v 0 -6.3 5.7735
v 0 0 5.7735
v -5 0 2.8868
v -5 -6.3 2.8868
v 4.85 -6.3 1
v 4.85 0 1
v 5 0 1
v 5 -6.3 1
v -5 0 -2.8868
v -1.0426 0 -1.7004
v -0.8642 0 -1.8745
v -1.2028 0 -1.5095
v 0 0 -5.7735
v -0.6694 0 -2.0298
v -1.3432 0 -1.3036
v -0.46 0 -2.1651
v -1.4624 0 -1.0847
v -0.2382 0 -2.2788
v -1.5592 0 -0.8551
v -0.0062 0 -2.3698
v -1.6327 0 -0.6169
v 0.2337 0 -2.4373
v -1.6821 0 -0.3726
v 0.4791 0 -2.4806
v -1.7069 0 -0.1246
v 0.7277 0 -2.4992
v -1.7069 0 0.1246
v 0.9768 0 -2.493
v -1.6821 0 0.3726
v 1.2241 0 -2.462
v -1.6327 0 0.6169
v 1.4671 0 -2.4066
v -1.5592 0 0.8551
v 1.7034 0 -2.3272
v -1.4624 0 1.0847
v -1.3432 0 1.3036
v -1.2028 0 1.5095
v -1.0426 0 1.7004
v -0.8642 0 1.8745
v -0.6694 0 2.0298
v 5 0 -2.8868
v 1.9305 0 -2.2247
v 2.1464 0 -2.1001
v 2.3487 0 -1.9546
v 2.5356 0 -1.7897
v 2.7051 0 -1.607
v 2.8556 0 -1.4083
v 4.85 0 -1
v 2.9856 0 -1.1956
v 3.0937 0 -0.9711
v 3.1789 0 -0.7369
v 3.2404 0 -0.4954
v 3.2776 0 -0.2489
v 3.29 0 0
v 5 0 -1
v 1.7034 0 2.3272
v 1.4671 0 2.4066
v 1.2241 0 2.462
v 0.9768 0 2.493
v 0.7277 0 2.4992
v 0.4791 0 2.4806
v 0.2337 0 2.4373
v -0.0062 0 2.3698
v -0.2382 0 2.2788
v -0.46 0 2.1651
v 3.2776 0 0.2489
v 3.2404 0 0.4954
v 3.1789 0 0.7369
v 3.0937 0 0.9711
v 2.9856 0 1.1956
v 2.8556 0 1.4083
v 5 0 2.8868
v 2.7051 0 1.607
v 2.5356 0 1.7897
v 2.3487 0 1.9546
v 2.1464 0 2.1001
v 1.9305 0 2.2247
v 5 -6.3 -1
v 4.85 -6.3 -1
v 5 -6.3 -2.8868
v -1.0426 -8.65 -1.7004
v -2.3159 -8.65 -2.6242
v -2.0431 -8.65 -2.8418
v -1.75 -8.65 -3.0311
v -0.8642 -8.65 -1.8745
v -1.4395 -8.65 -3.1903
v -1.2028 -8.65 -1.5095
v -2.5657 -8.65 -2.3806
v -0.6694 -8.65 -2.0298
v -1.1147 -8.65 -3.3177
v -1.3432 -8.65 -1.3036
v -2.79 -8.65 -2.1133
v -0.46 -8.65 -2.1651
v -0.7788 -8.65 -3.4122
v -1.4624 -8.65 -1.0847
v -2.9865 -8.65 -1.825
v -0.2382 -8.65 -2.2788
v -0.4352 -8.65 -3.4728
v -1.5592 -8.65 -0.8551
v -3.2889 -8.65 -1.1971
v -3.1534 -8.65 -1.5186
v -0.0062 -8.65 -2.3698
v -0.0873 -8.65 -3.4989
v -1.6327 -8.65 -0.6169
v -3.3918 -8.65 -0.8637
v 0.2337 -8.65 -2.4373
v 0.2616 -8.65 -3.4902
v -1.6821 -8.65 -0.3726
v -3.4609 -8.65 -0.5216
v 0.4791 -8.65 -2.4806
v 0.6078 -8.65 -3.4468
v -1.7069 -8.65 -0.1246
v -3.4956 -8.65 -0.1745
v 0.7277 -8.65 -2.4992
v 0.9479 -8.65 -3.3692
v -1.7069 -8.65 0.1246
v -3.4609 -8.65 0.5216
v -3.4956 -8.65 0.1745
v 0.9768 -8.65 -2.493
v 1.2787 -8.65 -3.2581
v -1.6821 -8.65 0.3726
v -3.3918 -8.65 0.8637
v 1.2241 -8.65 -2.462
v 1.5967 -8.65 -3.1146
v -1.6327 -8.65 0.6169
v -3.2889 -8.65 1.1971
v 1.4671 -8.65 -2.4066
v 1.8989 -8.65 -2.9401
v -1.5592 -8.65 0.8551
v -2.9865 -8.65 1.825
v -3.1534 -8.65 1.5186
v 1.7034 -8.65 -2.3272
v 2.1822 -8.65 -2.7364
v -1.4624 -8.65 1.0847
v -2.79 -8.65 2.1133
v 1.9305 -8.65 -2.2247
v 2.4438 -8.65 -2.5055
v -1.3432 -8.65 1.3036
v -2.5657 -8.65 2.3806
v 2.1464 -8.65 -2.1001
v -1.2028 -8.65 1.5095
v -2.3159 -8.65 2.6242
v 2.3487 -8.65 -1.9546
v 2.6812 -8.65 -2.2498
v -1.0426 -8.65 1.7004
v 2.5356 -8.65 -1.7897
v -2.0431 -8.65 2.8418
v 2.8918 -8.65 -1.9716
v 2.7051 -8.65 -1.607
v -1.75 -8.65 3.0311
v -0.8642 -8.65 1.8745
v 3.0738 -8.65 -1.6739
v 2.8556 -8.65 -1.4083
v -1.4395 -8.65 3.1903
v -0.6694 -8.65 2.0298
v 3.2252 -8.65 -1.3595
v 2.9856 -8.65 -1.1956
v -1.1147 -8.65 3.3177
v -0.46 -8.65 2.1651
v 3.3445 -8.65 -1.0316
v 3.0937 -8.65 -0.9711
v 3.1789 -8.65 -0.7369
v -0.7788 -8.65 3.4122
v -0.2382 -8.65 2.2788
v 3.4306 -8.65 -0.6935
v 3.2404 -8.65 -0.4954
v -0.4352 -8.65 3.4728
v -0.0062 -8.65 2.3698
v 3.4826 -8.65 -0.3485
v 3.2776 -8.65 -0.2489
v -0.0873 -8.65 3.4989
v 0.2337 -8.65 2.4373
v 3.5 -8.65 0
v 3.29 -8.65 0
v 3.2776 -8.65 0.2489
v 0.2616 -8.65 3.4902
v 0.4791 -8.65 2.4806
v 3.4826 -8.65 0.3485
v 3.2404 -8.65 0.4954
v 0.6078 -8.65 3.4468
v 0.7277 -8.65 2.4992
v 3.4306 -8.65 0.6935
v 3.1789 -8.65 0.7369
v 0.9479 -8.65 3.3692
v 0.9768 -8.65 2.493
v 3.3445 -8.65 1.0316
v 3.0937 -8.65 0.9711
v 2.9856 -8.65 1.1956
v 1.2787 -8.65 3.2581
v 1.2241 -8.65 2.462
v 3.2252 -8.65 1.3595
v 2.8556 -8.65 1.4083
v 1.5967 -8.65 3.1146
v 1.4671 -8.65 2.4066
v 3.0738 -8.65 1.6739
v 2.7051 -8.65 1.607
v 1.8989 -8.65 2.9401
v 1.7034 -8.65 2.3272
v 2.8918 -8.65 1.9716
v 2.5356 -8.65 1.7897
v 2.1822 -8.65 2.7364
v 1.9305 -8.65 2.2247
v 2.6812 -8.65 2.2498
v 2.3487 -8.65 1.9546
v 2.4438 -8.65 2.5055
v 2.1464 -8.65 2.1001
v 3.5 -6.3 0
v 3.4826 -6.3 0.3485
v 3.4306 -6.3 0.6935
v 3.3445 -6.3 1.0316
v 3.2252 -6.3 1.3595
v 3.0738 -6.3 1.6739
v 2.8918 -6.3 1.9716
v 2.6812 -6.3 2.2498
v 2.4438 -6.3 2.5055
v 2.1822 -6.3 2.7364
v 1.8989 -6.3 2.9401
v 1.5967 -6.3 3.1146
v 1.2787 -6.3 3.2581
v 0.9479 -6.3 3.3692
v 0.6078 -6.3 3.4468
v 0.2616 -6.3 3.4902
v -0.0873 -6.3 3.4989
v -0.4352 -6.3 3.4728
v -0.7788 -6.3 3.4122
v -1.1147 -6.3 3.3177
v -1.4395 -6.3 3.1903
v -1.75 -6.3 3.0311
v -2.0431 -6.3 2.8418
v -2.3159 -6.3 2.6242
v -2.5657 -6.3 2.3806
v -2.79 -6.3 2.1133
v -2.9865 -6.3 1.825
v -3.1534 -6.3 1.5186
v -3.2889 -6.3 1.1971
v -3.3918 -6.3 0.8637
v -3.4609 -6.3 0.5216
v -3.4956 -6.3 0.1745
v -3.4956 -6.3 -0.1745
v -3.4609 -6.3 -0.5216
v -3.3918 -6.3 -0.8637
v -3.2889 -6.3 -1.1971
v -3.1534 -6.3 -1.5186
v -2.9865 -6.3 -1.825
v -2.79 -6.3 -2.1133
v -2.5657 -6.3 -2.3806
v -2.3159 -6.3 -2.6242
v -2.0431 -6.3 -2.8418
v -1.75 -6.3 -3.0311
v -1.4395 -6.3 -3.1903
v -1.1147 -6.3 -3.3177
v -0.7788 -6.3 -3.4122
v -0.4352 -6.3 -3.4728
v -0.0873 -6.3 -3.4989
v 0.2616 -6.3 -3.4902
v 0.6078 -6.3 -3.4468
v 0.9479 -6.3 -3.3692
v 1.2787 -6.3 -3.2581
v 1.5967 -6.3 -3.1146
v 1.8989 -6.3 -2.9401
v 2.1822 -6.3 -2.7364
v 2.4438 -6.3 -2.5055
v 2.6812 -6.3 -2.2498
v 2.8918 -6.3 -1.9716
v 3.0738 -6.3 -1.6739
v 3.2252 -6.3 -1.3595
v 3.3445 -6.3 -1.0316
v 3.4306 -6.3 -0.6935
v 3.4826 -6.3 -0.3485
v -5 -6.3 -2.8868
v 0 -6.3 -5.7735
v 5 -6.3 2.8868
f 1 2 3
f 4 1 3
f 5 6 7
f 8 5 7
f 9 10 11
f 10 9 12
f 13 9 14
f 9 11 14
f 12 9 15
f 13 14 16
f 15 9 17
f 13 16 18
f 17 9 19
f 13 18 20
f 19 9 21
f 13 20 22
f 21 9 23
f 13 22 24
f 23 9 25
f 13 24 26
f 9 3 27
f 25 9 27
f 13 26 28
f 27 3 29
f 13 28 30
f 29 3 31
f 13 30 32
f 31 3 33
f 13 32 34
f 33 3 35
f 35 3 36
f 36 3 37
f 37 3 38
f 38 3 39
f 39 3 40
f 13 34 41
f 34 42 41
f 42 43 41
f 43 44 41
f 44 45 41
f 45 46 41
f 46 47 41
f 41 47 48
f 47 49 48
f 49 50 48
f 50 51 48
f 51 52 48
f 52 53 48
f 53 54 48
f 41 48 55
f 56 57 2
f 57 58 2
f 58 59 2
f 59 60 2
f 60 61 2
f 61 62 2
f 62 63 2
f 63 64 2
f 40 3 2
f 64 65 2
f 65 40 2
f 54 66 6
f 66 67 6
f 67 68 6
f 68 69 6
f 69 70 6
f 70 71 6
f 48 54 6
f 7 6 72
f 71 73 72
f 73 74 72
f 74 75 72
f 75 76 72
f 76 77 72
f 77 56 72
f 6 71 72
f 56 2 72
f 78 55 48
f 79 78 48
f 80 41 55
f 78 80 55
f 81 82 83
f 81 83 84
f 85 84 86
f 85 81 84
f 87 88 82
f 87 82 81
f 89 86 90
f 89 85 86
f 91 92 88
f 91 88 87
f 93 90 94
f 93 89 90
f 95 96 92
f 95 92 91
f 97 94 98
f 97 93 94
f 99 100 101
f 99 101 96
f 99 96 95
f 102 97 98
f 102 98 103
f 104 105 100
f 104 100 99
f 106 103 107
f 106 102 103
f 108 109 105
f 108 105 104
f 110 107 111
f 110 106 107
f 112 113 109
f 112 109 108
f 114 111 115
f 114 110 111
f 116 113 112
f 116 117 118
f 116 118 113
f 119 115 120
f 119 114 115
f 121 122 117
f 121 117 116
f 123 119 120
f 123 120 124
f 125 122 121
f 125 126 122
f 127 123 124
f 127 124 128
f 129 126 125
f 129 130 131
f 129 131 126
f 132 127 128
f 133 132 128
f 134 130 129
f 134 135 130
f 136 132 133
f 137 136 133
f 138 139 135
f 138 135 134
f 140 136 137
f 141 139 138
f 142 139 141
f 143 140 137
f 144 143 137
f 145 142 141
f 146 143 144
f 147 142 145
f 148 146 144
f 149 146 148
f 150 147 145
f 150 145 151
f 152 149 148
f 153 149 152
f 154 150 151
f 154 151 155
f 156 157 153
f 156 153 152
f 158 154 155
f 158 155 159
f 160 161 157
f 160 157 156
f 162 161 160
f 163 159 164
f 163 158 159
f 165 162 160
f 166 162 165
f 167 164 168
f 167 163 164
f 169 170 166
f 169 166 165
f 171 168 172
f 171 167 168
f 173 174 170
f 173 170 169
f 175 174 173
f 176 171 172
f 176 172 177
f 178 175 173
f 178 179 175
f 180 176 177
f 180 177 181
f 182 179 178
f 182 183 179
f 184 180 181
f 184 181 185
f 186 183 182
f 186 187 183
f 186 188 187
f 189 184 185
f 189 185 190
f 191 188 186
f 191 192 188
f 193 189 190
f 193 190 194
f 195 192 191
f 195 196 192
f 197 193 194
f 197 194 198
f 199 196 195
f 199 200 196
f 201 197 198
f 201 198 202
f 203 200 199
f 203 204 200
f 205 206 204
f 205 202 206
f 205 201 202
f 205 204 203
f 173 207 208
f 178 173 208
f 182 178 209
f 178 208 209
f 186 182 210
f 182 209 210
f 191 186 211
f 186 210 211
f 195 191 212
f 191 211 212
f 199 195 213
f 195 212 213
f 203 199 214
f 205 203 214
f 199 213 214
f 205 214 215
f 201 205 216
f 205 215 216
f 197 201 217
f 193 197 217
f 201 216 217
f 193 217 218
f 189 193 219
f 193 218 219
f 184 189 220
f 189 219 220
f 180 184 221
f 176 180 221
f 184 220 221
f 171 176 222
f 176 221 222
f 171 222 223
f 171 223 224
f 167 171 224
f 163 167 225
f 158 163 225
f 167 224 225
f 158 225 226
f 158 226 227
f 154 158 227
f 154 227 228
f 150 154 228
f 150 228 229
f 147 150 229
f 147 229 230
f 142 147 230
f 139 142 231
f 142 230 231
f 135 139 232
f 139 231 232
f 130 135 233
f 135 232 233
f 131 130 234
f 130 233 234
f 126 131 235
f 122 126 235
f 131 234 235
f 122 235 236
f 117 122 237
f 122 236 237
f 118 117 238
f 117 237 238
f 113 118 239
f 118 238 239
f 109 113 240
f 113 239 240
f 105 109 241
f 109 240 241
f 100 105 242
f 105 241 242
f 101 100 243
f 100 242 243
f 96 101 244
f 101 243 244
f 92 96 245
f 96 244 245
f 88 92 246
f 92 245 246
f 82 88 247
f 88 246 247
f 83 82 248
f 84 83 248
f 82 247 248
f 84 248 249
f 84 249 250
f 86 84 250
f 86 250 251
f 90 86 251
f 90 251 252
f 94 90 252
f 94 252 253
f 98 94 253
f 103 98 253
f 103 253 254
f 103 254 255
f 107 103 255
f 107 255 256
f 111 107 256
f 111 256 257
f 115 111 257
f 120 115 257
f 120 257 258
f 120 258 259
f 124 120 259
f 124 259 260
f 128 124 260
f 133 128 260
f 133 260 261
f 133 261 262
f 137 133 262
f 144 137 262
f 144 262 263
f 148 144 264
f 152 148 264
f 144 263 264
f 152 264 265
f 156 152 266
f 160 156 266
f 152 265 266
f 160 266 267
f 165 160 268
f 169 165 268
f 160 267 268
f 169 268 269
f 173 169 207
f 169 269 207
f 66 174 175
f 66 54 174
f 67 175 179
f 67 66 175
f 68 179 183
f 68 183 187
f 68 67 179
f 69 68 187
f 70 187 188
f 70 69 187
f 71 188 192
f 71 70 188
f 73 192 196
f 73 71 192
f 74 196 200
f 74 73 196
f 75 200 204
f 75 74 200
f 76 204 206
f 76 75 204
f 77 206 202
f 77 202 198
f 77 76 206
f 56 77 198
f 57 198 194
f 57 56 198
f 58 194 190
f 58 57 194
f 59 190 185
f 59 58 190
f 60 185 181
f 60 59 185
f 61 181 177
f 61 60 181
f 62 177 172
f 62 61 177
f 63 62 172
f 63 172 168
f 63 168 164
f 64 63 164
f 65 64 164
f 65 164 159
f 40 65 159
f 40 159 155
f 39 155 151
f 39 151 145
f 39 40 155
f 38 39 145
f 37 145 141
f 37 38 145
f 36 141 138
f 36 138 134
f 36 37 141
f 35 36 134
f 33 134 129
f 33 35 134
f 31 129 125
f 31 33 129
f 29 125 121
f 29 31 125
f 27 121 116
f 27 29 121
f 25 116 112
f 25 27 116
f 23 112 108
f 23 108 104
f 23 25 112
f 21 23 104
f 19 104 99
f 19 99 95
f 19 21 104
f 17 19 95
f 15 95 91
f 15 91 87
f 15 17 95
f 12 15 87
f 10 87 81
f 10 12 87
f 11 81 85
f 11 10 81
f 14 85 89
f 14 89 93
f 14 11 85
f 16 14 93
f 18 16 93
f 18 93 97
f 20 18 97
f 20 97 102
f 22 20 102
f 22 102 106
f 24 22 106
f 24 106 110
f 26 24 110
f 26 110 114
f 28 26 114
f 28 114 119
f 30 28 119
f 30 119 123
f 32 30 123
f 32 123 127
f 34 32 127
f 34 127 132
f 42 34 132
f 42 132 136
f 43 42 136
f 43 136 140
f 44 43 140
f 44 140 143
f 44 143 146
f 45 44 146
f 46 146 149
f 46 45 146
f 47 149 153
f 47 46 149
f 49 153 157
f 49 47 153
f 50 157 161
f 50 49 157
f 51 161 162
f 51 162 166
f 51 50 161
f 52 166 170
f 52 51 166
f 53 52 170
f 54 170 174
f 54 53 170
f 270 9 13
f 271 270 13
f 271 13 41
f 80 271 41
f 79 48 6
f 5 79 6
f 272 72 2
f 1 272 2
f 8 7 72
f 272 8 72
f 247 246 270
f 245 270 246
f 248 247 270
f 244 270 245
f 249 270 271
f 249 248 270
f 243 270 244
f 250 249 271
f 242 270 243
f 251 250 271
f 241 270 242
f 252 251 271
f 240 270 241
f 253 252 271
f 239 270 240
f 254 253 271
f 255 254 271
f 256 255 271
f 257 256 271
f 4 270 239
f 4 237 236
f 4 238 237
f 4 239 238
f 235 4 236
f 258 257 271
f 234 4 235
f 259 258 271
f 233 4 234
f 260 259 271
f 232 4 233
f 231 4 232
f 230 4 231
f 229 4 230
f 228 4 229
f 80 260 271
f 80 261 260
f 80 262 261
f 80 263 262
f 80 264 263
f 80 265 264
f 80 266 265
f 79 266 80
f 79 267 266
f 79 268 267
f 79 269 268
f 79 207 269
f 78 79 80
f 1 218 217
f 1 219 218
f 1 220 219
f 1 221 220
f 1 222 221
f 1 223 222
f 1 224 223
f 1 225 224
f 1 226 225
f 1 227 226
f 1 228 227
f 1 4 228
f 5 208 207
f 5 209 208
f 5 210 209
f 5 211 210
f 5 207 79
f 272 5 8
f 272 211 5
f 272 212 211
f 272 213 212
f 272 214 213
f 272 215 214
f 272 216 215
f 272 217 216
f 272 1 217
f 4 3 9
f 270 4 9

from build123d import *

# Parameters (mm, degrees)
F0_R     = 2.5
F1_DEPTH = 6.3
F3_R     = 3.5
F4_DEPTH = 2.35
F5_DEPTH = 8.65
F0_W     = 0.15
F0_H     = 2
F8_DEPTH = 22


# Not quite as in the source:
# - an extrude ends at something that could not be found from the text; its depth is read off the source's solid
# - a feature names something its author has since deleted; it is built from what else it names


with BuildPart() as f1:
    # F0 (on Front) → F1 (new body)
    with BuildSketch(Plane.XZ):
        Polygon((5, 1), (5, 2.8867513459), (0, 5.7735026919), (-5, 2.8867513459), (-5, -2.8867513459), (0, -5.7735026919), (5, -2.8867513459), (5, -1), (4.85, -1), (4.85, 1), align=None)
        with Locations((0.79, 0)):
            Circle(F0_R, mode=Mode.SUBTRACT)
    extrude(amount=F1_DEPTH)

    # F3 (on offset) → F4 (join)
    with BuildSketch(Plane.XZ.offset(6.3)):
        Circle(F3_R)
    extrude(amount=F4_DEPTH)

    # F0 (on Front) → F5 (cut, through all)
    with BuildSketch(Plane.XZ):
        with Locations((0.79, 0)):
            Circle(F0_R)
    extrude(amount=F5_DEPTH, mode=Mode.SUBTRACT)

    # F6 (on Top) → F7 (revolve, cut)
    with BuildSketch(Plane.XY):
        Polygon((-6.0966597098, -6.5938490836), (-5, -6.3), (-6.0966597098, -6.3), align=None)
    revolve(axis=Axis((0, -6.5372320823, 0), (0, -1, 0)), mode=Mode.SUBTRACT)

    # F0 (on Front) → F8 (cut, through all)
    with BuildSketch(Plane.XZ):
        with Locations((4.925, 0)):
            Rectangle(F0_W, F0_H)
    extrude(amount=-F8_DEPTH, mode=Mode.SUBTRACT)


solid = f1.part
